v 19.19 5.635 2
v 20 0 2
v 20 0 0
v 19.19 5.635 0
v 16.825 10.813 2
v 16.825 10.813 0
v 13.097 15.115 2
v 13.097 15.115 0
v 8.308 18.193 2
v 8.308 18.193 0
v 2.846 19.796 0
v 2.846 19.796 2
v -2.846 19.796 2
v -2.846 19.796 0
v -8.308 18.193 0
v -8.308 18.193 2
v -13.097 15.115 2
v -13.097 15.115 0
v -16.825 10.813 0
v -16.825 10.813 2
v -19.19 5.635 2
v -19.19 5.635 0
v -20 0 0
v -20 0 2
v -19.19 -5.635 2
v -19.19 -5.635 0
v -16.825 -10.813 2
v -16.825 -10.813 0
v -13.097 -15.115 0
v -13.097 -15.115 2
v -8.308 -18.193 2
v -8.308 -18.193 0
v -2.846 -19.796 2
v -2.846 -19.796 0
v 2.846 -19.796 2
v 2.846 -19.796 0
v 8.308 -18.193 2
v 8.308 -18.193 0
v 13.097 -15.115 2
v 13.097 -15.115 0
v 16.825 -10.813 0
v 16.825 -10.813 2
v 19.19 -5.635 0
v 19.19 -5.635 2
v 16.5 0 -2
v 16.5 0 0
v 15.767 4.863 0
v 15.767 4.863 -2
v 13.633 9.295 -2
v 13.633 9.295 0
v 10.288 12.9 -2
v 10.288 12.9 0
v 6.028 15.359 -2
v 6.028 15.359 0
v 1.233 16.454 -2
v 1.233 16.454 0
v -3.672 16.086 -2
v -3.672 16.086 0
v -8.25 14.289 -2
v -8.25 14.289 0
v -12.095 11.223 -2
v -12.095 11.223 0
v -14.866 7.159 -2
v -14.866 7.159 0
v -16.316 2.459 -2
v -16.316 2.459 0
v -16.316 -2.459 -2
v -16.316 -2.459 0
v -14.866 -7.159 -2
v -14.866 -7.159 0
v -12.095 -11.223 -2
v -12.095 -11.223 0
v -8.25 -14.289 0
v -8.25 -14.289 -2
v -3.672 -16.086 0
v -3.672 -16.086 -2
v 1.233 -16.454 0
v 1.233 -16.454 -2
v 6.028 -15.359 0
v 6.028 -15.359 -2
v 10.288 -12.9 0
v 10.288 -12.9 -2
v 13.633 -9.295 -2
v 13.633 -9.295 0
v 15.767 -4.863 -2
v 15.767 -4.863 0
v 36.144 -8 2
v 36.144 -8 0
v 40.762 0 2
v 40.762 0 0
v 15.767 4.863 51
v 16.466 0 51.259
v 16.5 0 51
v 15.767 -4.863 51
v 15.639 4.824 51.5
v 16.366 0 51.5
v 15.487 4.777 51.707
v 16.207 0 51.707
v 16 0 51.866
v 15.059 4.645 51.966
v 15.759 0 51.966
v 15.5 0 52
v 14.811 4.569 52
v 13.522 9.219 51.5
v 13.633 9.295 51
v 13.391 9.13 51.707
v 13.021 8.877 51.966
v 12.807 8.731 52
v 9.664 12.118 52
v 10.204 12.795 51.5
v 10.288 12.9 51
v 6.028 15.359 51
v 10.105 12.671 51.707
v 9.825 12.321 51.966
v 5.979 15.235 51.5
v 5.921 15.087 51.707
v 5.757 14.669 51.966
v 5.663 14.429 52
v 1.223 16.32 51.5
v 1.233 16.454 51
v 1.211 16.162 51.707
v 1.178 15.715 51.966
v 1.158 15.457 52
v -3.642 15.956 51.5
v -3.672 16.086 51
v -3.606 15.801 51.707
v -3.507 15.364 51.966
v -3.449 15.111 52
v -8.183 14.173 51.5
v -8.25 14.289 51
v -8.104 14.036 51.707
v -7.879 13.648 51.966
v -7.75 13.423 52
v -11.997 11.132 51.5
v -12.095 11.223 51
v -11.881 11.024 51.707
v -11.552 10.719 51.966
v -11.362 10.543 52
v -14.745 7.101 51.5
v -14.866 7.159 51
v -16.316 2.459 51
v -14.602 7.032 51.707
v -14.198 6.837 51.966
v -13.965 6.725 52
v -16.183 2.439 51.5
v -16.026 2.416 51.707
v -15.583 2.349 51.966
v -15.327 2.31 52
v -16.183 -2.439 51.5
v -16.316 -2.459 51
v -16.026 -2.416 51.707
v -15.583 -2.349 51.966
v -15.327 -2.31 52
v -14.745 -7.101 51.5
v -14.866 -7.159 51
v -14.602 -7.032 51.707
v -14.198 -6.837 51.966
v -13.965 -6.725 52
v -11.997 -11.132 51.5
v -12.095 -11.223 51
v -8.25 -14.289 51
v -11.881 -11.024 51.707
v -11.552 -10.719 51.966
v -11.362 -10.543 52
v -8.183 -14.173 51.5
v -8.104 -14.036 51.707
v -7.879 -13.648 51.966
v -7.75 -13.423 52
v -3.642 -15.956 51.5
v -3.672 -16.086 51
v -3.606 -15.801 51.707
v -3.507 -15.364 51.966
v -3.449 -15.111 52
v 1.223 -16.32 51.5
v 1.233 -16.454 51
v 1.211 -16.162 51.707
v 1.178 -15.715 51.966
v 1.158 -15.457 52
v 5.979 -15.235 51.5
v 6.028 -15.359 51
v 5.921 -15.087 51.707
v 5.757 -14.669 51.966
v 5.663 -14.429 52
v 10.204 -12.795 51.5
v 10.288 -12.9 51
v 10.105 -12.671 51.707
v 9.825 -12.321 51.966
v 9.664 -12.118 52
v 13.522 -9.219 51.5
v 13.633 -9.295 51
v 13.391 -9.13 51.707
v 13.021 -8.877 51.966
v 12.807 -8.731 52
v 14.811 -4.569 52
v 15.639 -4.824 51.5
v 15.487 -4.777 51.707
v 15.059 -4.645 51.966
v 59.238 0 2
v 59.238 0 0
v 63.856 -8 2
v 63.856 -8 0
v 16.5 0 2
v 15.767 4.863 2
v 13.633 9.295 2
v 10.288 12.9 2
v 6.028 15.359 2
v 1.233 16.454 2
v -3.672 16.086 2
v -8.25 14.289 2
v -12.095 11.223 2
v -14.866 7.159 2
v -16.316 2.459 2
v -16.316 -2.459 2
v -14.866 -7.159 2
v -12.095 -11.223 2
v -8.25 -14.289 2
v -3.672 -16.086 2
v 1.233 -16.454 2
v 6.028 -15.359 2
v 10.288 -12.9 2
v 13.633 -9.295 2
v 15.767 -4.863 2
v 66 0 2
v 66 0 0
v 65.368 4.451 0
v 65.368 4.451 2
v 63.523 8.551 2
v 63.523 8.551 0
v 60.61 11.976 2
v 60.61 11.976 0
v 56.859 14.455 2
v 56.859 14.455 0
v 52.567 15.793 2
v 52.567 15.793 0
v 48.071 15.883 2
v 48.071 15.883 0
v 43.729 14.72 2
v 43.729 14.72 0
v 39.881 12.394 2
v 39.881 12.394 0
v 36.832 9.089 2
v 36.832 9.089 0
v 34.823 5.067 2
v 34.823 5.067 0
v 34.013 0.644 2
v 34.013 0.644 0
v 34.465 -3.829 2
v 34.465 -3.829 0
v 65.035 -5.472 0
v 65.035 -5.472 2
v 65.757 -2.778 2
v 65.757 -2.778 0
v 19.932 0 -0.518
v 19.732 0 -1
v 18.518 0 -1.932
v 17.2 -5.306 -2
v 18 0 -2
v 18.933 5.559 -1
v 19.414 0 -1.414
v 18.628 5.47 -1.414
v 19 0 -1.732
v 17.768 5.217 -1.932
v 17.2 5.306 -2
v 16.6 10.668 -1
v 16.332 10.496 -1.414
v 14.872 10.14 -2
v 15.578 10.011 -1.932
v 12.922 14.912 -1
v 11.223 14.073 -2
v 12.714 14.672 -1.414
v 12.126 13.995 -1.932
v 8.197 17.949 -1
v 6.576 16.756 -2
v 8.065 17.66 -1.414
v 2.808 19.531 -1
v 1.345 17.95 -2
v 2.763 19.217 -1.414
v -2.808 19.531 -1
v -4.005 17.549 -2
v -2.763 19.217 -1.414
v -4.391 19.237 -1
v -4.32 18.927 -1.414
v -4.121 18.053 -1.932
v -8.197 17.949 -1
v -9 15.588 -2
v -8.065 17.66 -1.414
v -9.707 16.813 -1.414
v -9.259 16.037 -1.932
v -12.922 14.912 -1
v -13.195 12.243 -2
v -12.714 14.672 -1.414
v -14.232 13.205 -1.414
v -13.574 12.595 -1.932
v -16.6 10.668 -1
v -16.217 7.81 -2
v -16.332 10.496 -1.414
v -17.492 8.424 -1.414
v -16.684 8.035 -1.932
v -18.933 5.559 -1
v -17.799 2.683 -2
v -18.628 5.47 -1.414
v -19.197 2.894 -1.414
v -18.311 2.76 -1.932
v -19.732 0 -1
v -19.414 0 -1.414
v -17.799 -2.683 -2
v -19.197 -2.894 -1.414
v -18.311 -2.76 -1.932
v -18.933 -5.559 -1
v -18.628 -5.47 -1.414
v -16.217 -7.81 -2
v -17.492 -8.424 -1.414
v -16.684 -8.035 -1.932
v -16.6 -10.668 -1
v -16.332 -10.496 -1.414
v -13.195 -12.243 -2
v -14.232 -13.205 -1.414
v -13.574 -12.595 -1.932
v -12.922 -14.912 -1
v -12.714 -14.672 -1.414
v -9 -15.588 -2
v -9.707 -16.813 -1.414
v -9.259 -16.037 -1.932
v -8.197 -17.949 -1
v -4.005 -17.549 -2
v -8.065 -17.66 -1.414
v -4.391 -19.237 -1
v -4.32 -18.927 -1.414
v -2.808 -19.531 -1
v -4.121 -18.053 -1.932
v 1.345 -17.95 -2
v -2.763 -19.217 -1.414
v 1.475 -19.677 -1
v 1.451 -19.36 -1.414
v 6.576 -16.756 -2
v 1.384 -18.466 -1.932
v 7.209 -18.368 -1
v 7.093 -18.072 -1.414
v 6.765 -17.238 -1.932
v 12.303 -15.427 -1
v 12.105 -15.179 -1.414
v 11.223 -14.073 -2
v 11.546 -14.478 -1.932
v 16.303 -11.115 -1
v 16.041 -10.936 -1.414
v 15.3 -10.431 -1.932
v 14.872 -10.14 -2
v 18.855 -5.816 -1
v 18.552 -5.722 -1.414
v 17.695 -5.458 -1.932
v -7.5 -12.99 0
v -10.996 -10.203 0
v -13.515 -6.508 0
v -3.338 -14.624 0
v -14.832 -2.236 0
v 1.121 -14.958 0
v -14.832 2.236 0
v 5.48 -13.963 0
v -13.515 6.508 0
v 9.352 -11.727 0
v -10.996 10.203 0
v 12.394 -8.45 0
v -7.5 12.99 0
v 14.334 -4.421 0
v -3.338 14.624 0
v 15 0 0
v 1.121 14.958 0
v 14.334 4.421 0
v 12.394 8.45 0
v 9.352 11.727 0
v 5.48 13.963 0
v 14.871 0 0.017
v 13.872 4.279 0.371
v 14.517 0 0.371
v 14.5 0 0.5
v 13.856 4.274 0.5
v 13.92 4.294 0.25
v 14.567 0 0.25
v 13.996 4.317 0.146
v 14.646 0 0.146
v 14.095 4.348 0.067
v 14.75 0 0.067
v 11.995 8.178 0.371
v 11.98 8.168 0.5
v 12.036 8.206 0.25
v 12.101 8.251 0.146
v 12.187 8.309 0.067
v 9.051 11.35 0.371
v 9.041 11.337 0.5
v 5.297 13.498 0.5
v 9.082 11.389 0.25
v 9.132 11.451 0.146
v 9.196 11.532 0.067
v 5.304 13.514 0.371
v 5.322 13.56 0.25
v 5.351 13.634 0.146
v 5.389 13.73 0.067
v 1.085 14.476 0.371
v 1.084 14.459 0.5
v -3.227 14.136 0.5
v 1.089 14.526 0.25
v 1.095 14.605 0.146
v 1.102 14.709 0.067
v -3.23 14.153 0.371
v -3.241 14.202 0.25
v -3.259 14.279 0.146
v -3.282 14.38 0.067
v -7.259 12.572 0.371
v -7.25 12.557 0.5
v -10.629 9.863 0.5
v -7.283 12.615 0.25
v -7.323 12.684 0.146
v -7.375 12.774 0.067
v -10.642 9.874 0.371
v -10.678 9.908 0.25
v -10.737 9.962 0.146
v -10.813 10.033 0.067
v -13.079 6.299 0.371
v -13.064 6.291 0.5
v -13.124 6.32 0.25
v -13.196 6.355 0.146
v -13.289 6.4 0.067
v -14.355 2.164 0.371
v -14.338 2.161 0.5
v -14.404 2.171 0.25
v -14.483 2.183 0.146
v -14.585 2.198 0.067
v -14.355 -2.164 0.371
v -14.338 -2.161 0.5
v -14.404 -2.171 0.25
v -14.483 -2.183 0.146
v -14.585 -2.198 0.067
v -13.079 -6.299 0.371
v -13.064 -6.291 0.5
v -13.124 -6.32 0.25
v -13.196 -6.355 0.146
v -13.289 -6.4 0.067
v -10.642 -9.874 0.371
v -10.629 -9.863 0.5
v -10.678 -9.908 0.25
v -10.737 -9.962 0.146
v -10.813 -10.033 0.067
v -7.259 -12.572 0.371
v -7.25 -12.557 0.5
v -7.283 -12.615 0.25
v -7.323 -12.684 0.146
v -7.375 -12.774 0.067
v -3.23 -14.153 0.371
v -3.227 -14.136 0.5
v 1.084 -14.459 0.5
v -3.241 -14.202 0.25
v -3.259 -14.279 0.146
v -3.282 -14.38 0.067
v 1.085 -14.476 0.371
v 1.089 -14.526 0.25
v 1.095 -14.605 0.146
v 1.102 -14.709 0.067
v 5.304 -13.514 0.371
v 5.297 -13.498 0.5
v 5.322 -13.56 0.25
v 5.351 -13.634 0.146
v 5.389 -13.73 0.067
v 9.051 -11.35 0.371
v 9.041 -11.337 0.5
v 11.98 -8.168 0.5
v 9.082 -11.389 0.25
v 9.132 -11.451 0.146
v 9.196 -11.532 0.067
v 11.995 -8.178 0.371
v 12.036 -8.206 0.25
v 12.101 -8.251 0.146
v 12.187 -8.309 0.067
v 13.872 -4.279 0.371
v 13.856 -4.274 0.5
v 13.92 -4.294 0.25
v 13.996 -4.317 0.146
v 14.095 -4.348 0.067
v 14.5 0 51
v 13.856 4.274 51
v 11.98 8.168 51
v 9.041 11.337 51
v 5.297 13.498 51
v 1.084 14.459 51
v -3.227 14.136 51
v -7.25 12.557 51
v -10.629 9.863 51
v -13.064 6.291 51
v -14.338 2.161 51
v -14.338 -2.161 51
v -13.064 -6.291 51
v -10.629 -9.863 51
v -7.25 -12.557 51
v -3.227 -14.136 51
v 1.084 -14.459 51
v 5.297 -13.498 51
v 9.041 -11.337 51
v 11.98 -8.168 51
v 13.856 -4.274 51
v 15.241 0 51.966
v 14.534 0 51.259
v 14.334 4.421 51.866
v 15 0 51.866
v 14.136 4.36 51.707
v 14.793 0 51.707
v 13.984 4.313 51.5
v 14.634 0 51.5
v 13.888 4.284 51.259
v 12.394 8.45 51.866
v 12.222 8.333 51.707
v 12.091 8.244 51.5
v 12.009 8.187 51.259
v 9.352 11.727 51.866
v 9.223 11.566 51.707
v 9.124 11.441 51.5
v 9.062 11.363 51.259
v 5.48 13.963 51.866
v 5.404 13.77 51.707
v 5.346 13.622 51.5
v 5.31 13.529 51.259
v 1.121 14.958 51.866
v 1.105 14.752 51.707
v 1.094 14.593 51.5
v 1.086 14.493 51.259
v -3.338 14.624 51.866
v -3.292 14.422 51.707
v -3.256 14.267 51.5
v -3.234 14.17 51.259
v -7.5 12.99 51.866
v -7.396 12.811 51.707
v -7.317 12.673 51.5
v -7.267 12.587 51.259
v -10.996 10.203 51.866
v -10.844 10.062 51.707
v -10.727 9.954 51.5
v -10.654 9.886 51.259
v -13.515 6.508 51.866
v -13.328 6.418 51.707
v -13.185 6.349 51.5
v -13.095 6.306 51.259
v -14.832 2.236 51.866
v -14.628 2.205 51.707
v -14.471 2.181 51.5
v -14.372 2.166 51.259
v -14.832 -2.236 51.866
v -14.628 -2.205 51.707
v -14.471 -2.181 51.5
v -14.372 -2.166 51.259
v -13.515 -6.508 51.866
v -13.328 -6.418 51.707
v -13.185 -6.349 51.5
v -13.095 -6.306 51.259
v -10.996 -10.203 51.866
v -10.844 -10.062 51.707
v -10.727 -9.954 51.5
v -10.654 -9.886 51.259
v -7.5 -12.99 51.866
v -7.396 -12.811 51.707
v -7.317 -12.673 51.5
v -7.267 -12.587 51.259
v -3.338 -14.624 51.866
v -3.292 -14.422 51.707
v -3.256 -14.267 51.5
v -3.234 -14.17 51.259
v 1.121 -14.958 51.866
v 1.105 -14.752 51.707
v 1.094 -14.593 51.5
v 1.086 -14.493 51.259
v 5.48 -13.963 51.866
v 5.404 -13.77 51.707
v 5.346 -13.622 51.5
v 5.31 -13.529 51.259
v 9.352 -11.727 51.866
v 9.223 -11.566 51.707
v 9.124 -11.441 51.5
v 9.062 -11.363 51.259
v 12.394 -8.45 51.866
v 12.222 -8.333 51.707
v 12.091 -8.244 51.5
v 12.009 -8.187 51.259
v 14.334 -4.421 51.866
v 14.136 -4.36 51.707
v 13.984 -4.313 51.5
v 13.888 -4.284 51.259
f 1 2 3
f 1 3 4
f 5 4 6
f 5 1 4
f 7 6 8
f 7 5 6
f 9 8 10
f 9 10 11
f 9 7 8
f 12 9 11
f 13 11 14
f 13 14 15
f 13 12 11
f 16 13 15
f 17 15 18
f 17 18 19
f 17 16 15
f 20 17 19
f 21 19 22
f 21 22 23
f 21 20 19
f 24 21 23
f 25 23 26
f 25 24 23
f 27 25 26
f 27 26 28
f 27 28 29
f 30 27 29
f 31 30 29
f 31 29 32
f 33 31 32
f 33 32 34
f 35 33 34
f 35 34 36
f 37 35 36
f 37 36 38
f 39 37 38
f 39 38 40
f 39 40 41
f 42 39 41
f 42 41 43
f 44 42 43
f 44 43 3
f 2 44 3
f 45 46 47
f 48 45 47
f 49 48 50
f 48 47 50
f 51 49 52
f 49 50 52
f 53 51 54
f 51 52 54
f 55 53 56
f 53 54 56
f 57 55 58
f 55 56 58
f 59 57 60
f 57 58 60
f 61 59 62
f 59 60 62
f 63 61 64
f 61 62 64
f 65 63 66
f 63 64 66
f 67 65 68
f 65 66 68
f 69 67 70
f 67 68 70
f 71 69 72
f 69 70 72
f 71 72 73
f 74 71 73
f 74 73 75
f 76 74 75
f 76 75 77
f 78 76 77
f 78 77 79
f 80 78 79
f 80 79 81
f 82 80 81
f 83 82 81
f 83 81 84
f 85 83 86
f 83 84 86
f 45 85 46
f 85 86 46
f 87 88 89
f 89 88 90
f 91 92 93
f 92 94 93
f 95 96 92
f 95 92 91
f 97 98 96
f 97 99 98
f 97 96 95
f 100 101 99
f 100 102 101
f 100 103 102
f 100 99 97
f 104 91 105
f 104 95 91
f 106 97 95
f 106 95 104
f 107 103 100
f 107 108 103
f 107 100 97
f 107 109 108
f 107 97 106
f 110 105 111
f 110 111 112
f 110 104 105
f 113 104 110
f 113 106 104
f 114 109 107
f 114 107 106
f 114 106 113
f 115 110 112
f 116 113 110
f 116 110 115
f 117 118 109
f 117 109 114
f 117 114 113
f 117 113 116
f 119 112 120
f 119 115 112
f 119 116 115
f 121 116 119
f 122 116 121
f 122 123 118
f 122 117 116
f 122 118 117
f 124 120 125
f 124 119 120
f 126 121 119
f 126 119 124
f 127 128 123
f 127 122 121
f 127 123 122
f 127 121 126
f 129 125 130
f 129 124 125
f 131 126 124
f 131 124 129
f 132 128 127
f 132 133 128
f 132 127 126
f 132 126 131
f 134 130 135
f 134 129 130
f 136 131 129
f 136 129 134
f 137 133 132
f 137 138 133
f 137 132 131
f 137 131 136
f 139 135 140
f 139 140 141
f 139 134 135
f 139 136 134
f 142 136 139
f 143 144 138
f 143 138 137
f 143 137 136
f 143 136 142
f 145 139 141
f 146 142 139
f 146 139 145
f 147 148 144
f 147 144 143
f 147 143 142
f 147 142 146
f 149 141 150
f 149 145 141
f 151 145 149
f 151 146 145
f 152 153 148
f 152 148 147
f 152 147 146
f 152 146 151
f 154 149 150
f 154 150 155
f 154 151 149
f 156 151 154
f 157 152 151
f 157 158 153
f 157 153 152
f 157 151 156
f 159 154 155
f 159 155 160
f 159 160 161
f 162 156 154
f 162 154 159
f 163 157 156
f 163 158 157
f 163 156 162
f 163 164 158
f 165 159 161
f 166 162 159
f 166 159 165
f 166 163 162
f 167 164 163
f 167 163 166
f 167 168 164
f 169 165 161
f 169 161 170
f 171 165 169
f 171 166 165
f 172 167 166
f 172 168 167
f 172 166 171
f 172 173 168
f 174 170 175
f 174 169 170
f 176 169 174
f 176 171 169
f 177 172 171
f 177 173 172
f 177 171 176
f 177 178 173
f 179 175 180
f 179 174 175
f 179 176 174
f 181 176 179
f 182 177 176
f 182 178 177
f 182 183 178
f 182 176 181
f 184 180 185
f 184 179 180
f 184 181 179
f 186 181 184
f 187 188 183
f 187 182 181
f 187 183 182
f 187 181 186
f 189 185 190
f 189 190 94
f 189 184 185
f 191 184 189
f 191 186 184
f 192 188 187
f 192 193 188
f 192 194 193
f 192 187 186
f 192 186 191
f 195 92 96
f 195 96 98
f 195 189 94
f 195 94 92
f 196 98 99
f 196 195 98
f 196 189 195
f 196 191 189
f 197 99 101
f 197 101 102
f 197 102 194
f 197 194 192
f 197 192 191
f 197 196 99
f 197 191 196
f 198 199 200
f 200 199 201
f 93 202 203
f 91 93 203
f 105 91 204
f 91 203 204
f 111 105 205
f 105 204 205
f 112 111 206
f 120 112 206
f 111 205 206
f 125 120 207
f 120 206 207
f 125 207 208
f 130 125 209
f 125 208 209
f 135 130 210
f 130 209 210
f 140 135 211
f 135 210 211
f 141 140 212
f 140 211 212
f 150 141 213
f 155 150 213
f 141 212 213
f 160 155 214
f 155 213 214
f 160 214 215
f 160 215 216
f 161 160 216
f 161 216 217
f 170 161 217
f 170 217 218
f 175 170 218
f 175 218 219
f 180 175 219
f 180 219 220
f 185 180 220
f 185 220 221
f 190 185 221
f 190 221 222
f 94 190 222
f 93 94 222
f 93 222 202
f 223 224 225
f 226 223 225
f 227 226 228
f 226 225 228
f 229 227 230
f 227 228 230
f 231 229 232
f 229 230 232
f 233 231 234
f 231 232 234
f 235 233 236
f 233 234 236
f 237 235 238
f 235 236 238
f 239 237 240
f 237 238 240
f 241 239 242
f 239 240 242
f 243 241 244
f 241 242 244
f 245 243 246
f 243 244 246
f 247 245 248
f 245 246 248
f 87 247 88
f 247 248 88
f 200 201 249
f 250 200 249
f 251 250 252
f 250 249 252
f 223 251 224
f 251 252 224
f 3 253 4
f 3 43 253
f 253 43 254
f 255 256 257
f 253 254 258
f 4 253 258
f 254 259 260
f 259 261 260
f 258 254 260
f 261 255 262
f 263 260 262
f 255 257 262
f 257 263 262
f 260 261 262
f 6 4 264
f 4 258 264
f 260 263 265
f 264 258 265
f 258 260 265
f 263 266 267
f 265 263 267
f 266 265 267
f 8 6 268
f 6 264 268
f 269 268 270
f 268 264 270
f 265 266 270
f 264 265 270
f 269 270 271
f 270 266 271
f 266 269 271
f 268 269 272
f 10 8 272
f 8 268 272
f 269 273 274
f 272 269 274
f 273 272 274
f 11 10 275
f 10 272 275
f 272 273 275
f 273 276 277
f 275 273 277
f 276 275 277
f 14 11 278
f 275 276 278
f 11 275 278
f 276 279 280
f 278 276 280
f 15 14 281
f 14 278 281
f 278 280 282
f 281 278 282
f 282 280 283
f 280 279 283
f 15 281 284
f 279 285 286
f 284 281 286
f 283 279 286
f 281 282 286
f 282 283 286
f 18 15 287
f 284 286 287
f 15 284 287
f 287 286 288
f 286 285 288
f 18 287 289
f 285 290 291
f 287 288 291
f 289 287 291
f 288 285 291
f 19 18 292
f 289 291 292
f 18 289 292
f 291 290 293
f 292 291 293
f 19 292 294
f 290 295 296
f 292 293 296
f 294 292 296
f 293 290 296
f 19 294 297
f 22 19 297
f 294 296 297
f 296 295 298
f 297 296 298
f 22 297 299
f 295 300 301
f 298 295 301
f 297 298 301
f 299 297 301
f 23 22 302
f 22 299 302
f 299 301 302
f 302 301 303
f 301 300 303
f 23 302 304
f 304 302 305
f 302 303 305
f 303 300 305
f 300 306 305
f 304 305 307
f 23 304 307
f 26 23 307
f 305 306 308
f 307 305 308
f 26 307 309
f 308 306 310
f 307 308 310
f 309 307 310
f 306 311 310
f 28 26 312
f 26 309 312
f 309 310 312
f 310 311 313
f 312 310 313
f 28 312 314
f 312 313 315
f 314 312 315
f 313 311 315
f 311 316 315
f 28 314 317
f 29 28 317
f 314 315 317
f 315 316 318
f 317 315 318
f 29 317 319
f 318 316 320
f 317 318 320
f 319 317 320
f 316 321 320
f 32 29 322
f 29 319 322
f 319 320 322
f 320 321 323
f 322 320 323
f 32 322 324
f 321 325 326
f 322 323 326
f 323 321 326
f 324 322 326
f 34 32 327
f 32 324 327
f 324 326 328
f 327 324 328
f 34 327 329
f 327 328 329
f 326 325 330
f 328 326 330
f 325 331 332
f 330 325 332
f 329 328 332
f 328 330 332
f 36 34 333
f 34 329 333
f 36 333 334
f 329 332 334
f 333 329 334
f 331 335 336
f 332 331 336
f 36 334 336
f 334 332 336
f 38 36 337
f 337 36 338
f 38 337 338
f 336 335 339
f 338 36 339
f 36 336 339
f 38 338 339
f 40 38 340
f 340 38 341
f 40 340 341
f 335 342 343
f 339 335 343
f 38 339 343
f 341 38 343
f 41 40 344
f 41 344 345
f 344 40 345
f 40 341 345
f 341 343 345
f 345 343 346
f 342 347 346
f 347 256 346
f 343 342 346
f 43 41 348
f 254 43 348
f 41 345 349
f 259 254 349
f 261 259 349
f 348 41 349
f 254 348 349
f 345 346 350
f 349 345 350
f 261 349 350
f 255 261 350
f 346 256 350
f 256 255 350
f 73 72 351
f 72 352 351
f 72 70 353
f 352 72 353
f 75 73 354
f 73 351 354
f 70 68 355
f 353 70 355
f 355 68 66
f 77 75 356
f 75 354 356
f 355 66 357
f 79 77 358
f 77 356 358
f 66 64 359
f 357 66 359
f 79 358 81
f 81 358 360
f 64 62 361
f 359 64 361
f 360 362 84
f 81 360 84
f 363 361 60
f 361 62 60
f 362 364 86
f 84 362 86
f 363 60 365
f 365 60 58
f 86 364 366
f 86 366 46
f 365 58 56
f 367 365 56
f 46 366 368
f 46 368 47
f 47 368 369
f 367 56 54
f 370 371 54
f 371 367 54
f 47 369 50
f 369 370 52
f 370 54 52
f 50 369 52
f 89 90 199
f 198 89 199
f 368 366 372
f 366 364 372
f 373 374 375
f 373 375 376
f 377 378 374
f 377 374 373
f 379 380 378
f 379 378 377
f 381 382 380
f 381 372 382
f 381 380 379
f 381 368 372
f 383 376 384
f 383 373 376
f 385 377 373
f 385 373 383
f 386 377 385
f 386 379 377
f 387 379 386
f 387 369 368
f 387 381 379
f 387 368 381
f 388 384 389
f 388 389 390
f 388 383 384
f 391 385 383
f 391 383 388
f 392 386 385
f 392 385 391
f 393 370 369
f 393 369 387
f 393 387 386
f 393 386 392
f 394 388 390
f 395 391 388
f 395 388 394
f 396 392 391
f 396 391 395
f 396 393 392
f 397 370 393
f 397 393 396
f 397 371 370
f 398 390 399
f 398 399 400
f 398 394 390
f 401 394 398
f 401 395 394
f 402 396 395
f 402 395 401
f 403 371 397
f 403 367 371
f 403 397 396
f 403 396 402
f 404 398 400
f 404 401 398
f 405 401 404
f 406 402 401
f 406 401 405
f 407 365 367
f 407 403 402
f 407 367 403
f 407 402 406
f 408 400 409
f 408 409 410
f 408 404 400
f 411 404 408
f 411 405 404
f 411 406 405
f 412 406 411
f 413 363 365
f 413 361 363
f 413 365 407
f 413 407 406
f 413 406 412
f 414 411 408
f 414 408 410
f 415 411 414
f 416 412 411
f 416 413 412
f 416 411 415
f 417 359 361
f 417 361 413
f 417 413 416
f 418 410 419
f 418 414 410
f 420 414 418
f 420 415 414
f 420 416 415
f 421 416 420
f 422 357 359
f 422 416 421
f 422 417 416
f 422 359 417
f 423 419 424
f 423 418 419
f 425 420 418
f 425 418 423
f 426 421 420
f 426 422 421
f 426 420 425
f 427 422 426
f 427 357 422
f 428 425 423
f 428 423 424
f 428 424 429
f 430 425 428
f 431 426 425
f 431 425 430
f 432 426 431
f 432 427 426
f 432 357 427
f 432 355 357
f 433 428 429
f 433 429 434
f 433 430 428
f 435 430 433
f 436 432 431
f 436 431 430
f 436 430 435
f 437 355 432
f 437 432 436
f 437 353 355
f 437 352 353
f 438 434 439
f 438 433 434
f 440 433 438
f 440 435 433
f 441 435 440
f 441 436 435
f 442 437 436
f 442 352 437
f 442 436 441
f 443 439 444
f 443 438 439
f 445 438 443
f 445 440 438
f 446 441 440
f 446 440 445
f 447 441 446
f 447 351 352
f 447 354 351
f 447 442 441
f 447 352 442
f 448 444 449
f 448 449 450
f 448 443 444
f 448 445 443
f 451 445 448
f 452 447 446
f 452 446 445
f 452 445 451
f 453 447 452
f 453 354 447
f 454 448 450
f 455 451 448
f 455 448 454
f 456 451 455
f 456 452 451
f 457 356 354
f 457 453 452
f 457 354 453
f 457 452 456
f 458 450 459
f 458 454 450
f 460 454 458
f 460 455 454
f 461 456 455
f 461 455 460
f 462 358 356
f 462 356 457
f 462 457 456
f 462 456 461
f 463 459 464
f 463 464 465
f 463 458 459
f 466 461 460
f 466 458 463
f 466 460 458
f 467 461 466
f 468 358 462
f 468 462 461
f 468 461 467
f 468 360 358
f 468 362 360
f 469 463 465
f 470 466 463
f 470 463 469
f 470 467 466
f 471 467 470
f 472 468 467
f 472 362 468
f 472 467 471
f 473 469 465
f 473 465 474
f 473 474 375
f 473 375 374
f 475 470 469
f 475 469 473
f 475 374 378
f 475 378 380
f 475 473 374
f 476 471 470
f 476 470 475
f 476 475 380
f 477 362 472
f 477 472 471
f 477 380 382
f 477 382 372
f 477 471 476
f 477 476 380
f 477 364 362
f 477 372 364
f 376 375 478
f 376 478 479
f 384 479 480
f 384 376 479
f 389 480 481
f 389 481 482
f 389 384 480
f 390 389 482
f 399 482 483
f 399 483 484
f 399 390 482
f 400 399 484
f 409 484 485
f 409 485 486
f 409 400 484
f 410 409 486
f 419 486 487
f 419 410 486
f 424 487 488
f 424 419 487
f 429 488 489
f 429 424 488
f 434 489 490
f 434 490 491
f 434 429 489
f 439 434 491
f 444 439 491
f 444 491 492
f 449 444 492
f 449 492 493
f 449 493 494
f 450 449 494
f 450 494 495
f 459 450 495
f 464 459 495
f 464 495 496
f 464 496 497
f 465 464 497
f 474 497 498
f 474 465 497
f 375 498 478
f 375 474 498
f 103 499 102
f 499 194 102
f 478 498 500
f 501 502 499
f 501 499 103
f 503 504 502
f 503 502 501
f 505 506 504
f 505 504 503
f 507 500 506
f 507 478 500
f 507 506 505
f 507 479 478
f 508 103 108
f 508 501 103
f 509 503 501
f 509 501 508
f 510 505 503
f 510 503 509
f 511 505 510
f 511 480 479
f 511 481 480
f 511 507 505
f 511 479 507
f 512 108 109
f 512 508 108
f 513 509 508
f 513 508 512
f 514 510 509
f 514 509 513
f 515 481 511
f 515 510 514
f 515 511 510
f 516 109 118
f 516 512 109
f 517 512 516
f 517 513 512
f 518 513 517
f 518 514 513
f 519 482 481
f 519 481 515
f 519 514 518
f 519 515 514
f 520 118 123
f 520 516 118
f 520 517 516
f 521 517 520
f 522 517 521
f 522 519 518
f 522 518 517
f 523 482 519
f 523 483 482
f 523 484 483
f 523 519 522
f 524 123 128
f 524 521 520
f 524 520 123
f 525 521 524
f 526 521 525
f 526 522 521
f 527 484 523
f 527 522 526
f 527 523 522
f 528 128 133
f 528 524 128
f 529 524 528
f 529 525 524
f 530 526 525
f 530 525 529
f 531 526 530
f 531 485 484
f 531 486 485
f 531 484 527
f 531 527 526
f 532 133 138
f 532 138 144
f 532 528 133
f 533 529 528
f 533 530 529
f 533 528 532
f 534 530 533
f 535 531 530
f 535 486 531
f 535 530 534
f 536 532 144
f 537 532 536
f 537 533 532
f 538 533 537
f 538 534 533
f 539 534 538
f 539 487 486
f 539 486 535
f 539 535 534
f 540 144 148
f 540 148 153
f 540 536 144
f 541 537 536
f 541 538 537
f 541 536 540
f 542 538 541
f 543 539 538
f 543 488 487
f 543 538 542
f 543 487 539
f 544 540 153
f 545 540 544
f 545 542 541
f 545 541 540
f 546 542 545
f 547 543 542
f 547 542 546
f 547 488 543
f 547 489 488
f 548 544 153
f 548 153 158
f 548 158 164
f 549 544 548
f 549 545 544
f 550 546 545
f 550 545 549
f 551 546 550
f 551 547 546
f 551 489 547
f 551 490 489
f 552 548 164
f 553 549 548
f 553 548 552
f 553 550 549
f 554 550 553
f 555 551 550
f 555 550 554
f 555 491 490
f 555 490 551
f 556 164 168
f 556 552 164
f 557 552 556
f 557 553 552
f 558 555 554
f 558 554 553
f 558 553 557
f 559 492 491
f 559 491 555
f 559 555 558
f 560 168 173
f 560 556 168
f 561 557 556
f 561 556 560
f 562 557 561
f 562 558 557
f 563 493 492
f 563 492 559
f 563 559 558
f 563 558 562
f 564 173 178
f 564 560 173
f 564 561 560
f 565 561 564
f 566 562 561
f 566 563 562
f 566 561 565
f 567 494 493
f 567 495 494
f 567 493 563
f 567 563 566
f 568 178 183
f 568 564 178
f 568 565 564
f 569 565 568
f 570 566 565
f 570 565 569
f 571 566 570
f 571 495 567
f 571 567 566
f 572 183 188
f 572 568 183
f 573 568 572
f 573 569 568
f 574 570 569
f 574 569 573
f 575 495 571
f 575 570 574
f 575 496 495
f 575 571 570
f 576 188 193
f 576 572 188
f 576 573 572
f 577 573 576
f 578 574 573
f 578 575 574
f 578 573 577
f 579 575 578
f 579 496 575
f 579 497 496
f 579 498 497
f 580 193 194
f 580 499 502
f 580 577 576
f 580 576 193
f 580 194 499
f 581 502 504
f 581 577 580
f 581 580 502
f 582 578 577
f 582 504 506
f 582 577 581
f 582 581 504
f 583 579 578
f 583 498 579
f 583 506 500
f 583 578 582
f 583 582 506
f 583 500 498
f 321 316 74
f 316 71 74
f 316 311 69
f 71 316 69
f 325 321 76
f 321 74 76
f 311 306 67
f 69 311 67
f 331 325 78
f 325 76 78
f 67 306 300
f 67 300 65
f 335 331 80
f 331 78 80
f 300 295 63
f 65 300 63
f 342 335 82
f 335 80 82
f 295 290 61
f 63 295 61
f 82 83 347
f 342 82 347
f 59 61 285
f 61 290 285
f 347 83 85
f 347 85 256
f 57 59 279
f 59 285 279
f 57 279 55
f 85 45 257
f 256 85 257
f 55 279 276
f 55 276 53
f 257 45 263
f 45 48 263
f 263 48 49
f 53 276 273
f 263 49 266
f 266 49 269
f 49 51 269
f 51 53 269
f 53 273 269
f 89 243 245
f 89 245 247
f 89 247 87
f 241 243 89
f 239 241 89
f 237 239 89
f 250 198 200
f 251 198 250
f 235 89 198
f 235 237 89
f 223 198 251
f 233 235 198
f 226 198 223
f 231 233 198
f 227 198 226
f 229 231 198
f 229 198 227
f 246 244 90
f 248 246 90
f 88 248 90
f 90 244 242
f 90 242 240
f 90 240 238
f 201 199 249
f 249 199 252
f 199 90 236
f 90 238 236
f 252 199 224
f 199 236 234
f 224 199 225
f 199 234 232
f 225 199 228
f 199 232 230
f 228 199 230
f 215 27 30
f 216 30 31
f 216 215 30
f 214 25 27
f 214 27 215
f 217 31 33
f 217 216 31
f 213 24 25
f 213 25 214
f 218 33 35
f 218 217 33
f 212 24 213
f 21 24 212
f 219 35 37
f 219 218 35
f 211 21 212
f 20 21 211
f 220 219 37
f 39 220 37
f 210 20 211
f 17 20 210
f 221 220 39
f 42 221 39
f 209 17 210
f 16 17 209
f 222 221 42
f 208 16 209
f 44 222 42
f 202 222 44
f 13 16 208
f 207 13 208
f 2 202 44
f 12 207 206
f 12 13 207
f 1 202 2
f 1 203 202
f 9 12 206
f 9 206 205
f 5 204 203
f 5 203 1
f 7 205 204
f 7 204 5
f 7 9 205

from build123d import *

# Parameters (mm, degrees)
F0_R          = 16.5
F0_R_2        = 14.5
F1_DEPTH      = 52
F0_R_3        = 20
F2_DEPTH      = 2
F2_DEPTH_BACK = 2
F3_R          = 1.99999
F4_R          = 0.99999
F5_DEPTH      = 2
F6_R          = 0.5


# Not quite as in the source:
# - a fillet or chamfer is up to 0.001 mm smaller than in the source, because OpenCascade refuses the exact size


with BuildPart() as f1:
    # F0 (on Top) → F1 (new body)
    with BuildSketch(Plane.XY):
        Circle(F0_R)
        Circle(F0_R_2, mode=Mode.SUBTRACT)
    extrude(amount=F1_DEPTH)

    # F0 (on Top) → F2 (join, two sides)
    with BuildSketch(Plane.XY) as f2_sk:
        Circle(F0_R_3)
        Circle(F0_R, mode=Mode.SUBTRACT)
    extrude(amount=F2_DEPTH)
    extrude(f2_sk.sketch, amount=-F2_DEPTH_BACK)

    # F3 (radius 2 in the source; OpenCascade refuses exactly that, so slightly less here)
    f3_edges = [f1.edges().sort_by_distance(p)[0] for p in [
        (-20, 0, -2),
    ]]
    fillet(f3_edges, radius=F3_R)

    # F4 (radius 1 in the source; OpenCascade refuses exactly that, so slightly less here)
    f4_edges = [f1.edges().sort_by_distance(p)[0] for p in [
        (-16.5, 0, 52),
        (-14.5, 0, 52),
    ]]
    fillet(f4_edges, radius=F4_R)

    # F6
    f6_edges = [f1.edges().sort_by_distance(p)[0] for p in [
        (-14.5, 0, 0),
    ]]
    fillet(f6_edges, radius=F6_R)


with BuildPart() as f5:
    # F0 (on Top) → F5 (new body)
    with BuildSketch(Plane.XY):
        with BuildLine():
            ThreePointArc((63.8564064606, -8), (65.4548132206, -4.1411047216), (66, 0))
            ThreePointArc((66, 0), (45.8588952784, 15.4548132206), (36.1435935394, -8))
            Line((36.1435935394, -8), (40.762395693, 0))
            Line((40.762395693, 0), (59.237604307, 0))
            Line((59.237604307, 0), (63.8564064606, -8))
        make_face()
    extrude(amount=F5_DEPTH)


solid = Compound([f1.part, f5.part])
